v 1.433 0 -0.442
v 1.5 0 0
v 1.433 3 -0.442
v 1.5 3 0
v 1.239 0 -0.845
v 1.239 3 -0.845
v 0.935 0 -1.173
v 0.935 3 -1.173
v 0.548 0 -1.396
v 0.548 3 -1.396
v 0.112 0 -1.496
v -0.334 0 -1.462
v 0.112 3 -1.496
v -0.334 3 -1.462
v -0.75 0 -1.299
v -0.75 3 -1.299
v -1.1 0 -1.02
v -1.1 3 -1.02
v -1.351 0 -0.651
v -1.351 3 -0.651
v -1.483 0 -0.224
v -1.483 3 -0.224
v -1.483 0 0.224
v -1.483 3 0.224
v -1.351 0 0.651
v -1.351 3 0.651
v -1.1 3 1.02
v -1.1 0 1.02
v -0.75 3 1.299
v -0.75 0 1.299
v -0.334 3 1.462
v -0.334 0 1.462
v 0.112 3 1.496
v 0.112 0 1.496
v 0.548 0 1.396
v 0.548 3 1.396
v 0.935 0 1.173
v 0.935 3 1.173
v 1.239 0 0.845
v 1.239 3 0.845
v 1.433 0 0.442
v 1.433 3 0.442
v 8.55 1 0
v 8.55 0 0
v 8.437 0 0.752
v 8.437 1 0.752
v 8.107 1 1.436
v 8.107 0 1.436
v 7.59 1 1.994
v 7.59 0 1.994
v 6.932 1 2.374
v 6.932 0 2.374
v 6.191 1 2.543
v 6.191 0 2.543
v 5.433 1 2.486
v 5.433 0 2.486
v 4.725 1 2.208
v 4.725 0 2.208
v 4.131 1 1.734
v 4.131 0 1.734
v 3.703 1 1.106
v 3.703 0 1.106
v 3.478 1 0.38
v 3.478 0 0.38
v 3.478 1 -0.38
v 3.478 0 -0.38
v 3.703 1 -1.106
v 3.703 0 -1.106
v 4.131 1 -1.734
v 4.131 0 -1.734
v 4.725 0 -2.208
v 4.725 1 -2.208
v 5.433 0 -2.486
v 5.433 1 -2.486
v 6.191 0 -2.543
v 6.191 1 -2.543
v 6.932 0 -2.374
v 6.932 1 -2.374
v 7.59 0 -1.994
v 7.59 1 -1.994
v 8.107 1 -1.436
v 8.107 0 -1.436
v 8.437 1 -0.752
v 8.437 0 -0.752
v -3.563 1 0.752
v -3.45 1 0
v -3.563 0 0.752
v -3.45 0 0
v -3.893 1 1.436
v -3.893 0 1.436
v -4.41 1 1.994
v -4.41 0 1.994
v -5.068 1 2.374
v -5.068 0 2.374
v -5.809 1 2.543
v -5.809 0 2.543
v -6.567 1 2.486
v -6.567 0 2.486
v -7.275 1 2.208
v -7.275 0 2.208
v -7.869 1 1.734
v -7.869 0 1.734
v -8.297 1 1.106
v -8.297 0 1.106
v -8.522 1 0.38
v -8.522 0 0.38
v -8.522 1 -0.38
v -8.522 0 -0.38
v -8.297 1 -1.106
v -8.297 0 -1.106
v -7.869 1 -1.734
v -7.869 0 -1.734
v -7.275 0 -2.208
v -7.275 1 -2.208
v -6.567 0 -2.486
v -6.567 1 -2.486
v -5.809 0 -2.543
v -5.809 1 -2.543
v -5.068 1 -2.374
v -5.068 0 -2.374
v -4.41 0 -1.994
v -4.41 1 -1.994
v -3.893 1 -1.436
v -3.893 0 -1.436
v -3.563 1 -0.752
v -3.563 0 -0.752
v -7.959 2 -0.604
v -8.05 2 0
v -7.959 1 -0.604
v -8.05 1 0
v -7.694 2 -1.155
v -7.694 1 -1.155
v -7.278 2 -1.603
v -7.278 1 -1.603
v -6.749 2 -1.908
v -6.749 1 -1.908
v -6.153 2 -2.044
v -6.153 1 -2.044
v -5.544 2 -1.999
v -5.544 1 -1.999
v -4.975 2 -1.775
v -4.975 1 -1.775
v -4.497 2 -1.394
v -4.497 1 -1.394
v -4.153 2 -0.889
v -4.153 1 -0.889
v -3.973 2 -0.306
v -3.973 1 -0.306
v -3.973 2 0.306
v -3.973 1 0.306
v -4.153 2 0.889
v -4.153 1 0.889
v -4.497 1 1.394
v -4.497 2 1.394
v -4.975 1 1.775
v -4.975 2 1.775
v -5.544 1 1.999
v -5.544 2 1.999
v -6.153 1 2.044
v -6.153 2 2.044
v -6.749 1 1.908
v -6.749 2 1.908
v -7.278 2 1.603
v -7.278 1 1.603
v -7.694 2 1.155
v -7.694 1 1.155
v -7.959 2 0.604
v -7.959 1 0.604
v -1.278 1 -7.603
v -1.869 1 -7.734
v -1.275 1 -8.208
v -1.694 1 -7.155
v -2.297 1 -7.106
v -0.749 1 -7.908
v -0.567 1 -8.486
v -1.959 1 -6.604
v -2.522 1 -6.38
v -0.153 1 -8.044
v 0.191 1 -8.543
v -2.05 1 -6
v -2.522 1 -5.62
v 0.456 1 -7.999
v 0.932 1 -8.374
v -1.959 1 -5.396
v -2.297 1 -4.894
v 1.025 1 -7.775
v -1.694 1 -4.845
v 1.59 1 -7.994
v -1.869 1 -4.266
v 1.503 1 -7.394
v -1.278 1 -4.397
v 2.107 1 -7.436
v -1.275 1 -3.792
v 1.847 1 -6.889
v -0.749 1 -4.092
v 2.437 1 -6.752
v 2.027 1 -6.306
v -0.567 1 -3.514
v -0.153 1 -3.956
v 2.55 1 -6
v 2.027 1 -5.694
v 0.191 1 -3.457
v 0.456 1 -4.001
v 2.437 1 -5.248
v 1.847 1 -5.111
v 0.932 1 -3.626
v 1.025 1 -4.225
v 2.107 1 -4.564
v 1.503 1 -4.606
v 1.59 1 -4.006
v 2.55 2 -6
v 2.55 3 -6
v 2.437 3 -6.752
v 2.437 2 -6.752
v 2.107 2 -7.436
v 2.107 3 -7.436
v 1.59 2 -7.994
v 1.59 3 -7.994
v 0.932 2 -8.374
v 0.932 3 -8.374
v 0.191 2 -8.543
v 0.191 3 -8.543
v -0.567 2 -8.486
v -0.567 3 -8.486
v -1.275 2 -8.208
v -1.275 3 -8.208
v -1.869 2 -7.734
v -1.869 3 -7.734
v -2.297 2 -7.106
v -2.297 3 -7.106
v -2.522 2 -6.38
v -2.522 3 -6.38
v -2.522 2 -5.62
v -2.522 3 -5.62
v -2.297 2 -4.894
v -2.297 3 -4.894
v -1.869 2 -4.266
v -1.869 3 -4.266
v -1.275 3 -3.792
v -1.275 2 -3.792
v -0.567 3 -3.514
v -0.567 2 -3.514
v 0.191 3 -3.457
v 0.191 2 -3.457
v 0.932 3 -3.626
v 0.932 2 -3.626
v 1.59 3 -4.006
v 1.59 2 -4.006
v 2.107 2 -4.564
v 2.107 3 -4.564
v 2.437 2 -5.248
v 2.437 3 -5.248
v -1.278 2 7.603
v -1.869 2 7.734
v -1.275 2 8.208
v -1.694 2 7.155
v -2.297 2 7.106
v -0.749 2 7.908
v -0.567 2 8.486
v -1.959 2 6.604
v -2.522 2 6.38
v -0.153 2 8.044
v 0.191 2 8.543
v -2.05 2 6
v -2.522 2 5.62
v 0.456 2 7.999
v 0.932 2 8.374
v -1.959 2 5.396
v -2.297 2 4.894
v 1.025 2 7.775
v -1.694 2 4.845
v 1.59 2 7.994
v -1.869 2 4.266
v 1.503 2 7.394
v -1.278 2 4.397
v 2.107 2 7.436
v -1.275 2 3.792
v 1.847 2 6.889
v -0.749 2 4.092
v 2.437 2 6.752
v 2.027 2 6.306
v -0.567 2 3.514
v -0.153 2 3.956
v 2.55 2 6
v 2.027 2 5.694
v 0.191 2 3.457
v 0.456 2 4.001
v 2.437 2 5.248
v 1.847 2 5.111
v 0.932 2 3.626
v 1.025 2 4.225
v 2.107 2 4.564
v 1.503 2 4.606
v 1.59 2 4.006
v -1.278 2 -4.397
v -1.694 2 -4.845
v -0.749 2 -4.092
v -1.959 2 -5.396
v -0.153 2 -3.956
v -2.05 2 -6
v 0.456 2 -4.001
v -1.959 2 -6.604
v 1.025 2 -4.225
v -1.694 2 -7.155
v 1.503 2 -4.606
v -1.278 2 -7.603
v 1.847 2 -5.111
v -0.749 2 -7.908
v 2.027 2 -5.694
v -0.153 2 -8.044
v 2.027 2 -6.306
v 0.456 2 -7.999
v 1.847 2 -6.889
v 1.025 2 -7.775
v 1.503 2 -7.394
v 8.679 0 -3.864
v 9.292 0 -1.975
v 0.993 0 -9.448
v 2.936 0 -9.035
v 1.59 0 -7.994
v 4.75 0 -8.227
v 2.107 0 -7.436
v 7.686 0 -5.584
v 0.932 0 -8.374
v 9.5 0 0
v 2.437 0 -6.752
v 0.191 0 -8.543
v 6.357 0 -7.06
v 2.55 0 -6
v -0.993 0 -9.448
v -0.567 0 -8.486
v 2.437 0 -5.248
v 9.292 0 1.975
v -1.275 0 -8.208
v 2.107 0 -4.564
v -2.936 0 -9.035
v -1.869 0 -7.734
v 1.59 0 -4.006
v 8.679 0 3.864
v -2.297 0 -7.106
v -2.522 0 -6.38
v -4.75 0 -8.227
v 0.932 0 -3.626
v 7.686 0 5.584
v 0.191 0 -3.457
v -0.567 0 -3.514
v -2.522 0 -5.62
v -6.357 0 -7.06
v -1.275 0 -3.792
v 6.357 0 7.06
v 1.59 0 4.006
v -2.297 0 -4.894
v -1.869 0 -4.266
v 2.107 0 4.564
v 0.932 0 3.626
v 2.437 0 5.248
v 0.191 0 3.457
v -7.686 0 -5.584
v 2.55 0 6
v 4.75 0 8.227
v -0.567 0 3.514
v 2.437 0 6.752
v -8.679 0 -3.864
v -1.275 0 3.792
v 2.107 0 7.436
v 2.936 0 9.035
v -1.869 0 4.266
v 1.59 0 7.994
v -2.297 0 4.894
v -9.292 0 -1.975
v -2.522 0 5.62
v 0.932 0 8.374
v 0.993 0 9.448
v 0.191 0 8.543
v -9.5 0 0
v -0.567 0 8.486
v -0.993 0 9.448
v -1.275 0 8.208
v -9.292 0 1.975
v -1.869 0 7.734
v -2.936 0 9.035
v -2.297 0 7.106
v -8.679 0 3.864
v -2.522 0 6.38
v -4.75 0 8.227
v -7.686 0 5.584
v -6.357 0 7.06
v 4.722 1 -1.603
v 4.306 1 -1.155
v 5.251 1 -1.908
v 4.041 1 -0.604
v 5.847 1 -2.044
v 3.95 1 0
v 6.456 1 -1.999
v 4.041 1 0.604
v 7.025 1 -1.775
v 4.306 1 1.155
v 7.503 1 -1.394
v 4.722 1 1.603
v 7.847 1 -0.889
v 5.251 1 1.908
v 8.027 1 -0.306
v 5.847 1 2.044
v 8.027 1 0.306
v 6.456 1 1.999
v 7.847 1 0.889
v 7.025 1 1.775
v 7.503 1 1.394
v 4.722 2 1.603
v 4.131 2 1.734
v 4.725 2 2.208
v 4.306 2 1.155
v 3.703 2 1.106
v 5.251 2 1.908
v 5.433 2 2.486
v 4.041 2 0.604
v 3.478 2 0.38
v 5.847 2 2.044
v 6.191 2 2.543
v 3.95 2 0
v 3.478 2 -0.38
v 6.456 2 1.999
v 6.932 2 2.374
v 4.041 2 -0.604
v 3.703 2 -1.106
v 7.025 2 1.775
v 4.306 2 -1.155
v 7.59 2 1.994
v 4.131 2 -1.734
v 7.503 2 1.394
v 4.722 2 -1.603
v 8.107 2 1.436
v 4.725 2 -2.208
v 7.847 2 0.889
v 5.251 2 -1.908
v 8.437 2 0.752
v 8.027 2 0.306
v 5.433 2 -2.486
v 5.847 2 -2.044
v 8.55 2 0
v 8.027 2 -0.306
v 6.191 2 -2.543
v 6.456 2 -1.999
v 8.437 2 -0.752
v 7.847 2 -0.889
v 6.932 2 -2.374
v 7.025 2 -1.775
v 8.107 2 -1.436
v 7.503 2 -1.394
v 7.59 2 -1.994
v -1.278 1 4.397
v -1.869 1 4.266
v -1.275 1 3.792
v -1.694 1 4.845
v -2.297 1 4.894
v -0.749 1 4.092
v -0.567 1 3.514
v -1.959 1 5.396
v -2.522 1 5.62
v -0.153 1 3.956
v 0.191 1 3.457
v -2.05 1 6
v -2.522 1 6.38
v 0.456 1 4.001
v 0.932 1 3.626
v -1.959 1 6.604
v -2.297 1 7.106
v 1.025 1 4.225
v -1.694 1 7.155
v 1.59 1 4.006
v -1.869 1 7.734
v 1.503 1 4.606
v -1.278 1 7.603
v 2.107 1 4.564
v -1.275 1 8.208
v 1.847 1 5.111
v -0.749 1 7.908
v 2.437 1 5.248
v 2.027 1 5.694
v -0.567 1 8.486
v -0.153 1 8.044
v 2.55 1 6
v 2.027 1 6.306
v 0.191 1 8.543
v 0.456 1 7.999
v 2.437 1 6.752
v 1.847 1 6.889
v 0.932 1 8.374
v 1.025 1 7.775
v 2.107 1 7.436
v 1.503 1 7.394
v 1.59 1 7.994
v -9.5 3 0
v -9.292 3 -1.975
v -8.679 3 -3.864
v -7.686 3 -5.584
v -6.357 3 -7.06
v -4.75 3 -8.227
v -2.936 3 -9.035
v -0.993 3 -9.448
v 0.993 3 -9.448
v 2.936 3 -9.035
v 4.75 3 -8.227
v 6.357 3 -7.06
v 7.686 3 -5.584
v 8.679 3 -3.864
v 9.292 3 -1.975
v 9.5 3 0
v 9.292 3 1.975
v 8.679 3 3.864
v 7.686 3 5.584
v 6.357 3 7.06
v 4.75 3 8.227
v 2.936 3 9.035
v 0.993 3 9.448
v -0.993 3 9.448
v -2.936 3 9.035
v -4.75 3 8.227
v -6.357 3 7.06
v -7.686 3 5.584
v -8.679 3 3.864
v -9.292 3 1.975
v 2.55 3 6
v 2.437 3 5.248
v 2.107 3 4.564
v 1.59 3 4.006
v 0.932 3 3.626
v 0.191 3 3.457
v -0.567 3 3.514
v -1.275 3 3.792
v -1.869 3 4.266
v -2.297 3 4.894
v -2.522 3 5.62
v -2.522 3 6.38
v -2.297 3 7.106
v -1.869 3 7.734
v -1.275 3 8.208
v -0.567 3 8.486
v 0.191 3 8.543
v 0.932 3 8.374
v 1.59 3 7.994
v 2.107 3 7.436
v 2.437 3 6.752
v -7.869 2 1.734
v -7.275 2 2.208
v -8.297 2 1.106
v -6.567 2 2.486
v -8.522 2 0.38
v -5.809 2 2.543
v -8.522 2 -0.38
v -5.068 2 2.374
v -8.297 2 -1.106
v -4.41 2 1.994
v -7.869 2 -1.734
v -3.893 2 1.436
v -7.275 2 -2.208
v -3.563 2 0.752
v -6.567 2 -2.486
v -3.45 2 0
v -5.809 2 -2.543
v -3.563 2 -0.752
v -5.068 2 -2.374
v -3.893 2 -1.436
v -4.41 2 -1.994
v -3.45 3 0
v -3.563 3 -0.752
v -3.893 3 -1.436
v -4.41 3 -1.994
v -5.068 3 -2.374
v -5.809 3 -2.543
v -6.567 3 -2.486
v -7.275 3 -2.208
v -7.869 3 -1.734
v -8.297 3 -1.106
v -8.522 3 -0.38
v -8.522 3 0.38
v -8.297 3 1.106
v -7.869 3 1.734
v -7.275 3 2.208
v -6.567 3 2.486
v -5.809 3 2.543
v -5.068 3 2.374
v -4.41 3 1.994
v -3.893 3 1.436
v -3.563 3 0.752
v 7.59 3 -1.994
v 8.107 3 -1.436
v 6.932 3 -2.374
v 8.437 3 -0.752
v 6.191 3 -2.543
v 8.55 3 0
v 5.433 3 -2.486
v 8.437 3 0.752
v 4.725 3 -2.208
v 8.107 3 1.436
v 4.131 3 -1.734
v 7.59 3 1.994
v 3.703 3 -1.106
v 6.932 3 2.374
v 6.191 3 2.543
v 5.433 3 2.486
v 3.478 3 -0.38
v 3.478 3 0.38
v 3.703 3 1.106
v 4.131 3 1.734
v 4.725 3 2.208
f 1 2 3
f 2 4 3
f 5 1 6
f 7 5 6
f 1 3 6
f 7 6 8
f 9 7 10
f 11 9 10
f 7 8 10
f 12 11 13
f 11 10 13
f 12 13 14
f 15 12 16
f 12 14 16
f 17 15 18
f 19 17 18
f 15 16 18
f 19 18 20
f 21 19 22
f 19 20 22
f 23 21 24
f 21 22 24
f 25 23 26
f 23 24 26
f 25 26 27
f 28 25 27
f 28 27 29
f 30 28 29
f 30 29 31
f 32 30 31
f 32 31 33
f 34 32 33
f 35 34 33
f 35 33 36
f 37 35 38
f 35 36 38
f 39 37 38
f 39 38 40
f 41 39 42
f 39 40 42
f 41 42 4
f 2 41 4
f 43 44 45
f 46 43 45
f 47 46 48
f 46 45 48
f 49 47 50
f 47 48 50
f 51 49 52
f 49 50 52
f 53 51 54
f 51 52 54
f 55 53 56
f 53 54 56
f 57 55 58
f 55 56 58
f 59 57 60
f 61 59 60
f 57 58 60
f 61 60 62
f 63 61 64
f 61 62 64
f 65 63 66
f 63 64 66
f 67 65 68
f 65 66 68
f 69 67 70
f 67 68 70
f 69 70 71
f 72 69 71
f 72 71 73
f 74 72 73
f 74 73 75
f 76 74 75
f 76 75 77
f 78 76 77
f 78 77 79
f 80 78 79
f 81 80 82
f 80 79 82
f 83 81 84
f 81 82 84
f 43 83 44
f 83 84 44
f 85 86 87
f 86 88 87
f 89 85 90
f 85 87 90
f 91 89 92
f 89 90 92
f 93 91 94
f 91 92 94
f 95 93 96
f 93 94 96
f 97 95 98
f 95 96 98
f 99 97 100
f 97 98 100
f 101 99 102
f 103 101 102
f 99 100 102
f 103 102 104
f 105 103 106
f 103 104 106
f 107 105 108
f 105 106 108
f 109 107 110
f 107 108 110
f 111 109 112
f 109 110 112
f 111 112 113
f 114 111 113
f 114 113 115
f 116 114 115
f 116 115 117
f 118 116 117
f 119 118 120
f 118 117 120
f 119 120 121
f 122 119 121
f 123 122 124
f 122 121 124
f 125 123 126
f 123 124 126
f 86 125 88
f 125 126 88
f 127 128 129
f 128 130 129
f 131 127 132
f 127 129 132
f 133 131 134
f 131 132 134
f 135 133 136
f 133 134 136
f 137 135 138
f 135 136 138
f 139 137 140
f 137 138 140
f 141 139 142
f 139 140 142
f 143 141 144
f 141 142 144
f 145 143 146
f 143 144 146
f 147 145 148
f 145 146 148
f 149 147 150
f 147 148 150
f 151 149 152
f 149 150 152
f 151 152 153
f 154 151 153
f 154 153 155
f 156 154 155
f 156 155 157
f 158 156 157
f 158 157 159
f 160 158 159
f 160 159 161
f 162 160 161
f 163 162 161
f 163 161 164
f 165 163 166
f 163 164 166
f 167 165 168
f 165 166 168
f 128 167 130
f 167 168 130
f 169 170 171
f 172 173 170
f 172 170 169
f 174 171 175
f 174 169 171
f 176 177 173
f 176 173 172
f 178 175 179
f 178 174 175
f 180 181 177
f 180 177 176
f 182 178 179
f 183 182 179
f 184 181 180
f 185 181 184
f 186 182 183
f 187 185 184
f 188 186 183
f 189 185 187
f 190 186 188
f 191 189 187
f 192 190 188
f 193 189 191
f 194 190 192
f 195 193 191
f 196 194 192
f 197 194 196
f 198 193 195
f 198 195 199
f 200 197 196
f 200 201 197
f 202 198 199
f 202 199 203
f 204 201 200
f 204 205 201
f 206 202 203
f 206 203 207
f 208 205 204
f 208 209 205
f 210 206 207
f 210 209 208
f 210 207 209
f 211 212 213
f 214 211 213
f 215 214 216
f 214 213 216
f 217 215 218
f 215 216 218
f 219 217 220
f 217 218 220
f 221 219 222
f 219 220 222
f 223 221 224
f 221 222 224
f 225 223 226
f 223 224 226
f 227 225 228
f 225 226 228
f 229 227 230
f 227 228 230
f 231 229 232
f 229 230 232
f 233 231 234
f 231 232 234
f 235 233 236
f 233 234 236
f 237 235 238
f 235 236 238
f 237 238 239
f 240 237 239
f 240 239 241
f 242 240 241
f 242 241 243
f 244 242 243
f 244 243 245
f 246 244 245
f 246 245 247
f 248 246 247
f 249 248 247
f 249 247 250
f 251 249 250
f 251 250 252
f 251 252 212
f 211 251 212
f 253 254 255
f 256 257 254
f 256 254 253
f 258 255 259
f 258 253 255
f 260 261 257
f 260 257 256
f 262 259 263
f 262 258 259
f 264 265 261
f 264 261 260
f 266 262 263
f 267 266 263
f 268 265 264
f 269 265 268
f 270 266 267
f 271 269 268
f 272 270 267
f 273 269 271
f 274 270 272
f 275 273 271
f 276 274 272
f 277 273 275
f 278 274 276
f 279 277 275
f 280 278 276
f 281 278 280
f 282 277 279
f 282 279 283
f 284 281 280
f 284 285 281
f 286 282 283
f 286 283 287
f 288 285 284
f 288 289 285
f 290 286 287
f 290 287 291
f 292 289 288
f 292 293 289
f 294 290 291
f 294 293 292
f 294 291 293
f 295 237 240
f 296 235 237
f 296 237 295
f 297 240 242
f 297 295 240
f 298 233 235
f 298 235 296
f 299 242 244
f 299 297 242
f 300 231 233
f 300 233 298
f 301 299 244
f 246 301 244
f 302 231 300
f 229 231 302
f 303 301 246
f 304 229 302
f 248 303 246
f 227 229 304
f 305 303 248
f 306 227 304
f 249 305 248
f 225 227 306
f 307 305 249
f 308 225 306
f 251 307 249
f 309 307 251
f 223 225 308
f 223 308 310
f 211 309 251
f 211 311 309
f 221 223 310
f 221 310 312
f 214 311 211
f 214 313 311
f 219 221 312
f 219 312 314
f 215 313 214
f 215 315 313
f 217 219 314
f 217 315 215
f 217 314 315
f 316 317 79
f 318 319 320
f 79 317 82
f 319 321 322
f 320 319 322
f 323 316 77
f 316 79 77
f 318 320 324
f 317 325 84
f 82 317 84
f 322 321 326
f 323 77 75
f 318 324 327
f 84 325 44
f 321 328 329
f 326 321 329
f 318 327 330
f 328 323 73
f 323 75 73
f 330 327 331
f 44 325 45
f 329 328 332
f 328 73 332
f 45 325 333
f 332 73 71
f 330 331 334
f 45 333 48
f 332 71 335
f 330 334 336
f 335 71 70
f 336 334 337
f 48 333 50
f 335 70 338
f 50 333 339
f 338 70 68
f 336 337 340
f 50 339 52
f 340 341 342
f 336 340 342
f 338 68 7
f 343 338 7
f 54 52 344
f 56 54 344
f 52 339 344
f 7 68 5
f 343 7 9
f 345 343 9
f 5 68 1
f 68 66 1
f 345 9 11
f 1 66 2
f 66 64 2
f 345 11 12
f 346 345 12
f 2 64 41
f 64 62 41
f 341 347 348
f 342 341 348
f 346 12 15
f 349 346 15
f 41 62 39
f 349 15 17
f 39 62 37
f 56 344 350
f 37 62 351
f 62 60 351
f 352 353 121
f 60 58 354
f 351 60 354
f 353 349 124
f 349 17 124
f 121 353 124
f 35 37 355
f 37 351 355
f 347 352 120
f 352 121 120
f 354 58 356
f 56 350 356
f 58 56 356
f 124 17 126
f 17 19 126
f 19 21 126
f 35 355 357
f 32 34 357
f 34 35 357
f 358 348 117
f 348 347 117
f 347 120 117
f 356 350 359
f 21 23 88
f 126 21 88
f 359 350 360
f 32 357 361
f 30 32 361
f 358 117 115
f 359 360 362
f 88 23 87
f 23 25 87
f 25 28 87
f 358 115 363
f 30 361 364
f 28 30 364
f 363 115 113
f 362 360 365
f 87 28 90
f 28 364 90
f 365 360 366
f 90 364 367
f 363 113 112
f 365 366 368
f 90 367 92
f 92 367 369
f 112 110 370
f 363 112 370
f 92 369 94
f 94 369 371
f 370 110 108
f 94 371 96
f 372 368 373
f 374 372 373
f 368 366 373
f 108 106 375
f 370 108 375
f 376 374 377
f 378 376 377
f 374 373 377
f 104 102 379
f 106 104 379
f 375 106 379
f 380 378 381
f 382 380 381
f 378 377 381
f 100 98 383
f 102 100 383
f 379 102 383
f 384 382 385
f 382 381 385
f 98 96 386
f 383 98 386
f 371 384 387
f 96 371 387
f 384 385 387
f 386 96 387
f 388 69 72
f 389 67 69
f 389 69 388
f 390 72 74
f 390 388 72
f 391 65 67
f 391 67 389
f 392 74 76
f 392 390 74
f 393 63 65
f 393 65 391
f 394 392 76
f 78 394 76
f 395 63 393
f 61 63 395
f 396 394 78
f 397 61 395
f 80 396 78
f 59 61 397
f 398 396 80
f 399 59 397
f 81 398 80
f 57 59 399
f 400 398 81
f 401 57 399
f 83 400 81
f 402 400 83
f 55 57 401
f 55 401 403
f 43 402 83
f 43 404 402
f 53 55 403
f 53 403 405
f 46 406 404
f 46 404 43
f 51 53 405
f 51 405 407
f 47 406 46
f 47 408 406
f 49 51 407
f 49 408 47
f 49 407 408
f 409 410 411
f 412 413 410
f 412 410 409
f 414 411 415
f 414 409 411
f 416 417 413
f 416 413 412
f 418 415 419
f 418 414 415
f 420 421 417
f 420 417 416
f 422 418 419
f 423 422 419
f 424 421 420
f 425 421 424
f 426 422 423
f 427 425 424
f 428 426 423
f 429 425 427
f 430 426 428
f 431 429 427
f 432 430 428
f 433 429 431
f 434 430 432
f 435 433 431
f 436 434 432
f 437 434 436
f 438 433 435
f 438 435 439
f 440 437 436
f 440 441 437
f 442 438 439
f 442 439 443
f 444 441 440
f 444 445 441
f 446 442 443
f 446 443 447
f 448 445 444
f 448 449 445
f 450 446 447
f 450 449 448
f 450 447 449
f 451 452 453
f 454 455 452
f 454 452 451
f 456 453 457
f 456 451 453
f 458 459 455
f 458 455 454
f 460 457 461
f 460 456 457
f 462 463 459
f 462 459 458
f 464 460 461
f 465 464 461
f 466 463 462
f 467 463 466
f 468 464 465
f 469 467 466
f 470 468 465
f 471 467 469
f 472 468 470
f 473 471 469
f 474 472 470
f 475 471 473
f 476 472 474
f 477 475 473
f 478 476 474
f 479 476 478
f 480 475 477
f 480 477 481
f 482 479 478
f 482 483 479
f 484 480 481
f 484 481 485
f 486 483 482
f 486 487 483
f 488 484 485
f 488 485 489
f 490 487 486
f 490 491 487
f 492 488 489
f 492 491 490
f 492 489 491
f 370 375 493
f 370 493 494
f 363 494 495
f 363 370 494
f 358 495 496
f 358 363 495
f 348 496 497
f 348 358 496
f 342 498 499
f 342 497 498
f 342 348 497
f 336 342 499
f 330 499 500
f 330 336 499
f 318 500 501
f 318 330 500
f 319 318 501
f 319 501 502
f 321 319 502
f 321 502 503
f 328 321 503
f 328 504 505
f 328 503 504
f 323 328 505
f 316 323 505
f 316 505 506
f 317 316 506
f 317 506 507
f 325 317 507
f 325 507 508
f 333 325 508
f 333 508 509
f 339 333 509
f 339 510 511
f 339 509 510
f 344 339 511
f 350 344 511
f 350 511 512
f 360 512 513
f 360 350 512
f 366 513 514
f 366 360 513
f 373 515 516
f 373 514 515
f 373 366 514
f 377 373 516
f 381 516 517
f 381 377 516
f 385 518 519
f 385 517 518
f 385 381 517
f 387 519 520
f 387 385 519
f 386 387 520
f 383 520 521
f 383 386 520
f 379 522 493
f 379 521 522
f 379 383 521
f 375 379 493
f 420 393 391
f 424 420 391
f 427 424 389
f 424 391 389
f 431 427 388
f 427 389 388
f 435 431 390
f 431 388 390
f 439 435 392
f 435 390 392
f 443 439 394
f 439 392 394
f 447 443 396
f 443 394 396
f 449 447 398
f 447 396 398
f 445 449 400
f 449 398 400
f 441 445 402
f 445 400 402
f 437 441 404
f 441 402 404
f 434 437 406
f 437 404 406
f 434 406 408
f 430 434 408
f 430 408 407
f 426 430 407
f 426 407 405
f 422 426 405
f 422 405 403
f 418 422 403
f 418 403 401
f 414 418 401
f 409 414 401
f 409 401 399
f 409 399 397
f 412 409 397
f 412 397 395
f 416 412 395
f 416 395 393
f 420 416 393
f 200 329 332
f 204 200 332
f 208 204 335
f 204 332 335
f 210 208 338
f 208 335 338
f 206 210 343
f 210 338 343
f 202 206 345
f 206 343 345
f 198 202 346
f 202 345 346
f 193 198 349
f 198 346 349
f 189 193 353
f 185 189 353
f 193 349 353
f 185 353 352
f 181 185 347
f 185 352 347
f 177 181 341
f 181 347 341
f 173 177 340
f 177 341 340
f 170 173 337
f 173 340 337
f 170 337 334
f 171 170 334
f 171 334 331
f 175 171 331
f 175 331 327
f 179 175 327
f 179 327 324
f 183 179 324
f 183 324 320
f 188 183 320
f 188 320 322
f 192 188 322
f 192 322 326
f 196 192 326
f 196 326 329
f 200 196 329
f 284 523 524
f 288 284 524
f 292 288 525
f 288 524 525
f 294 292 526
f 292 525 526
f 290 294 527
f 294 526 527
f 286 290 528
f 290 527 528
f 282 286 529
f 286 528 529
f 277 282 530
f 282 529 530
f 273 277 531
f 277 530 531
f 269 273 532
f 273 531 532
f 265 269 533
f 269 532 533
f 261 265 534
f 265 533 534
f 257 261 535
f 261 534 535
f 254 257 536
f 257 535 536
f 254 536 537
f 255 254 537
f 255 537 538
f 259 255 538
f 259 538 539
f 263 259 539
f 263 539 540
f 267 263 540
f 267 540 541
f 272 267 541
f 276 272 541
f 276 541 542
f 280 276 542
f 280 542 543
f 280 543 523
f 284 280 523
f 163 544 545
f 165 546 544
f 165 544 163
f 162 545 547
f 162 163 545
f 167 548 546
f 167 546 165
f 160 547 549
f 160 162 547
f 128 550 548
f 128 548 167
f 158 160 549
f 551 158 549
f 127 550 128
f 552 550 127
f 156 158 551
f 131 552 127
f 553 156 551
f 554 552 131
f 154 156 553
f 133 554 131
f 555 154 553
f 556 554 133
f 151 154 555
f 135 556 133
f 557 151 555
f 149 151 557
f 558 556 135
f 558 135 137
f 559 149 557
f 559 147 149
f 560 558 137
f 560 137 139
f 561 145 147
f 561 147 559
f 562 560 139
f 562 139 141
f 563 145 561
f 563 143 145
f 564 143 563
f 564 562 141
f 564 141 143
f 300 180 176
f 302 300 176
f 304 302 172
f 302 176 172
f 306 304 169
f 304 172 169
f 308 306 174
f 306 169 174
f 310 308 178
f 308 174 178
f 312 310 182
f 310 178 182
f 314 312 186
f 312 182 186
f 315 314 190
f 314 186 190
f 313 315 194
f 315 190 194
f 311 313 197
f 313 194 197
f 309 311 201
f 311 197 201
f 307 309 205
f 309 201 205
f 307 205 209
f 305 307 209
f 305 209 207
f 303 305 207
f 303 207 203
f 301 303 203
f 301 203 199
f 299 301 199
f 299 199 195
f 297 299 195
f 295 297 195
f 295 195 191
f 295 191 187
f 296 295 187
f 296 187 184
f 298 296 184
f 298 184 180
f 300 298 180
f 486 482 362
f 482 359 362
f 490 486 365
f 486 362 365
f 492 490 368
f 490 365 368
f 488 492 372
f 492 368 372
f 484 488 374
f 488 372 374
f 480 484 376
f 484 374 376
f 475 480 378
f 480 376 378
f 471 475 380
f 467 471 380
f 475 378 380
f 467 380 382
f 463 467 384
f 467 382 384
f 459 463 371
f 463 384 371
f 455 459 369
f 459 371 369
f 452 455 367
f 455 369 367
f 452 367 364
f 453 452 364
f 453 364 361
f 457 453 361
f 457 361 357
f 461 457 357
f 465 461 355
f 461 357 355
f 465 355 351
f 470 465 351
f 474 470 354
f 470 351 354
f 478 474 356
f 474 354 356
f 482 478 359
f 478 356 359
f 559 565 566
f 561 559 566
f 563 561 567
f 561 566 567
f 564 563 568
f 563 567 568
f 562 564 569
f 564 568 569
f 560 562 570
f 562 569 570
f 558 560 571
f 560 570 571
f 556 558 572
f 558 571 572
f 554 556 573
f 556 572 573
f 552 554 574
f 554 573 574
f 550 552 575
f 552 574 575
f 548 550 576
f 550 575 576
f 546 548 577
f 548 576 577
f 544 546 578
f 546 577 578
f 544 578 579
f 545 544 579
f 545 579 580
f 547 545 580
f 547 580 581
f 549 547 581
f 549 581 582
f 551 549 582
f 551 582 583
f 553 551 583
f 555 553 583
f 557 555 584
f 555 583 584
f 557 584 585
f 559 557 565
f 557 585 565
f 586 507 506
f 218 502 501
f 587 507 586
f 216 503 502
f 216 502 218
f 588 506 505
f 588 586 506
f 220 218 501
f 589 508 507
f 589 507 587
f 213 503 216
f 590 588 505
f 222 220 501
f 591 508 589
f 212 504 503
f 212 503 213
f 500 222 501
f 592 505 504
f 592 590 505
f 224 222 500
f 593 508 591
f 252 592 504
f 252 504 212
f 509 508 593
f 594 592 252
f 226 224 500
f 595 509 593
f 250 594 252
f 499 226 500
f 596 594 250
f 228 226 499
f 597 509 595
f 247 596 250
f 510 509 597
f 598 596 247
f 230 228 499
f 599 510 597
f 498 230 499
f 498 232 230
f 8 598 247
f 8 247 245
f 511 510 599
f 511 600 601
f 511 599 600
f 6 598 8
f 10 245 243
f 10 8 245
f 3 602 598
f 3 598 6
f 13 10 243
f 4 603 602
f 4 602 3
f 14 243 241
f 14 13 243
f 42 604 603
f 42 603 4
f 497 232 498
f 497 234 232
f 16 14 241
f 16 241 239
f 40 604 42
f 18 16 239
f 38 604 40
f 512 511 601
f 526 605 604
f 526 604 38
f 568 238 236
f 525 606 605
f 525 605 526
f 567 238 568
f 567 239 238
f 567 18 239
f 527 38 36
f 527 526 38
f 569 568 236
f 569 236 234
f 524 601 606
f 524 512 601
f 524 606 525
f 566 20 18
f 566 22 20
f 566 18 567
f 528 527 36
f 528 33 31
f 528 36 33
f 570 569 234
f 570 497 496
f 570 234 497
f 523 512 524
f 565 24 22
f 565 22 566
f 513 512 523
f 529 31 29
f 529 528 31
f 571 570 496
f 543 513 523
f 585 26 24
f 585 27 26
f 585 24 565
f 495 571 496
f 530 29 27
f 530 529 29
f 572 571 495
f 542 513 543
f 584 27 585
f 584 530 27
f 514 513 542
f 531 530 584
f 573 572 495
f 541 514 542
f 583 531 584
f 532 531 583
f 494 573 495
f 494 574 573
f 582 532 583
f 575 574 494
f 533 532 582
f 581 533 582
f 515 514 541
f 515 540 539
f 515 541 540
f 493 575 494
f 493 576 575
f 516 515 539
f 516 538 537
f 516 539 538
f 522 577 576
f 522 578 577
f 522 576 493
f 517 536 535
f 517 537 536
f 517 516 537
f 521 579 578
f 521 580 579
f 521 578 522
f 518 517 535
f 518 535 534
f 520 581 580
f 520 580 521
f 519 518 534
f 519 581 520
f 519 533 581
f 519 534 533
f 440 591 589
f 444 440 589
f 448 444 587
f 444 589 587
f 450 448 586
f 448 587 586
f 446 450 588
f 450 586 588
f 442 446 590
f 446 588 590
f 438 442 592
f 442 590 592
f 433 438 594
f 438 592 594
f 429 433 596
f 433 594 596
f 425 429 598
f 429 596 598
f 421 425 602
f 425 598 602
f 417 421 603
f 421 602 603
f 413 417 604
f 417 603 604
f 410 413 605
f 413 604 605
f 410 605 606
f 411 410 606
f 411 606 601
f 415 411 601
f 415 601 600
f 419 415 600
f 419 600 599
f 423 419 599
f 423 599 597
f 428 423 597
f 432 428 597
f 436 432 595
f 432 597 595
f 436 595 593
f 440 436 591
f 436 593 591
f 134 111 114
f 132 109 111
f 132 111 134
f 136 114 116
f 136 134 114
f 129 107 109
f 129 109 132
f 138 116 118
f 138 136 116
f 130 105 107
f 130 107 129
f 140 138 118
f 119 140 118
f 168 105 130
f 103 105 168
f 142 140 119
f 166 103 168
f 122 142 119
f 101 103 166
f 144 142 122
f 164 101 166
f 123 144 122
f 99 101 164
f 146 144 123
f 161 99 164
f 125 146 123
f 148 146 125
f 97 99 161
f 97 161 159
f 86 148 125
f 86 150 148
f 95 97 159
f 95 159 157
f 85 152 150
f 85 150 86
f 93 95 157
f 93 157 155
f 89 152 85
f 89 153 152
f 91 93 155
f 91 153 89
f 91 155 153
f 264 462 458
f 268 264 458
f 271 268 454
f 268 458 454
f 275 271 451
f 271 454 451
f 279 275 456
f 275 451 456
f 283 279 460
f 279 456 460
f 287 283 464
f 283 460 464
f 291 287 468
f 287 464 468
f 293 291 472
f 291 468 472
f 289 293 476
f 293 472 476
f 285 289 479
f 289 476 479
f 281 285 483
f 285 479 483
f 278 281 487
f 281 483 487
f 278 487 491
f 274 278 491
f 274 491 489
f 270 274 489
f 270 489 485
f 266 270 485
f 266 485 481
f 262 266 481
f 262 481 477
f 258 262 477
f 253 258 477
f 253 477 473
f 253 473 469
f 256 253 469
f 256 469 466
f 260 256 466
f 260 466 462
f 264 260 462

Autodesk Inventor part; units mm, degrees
ref_plane "YZ Plane" through (0, 0, 0) normal (1, 0, 0) x (0, 1, 0)
ref_plane "XZ Plane" through (0, 0, 0) normal (0, 1, 0) x (-1, 0, 0)
ref_plane "XY Plane" through (0, 0, 0) normal (0, 0, 1) x (1, 0, 0)
sketch "Esquisse1" plane through (0, 0, 0) normal (0, 1, 0) x (-1, 0, 0)
  circle A0 centre (0, 0) radius 9.5
  circle A1 centre (0, 0) radius 2.05 construction
  line L0 (0, 9.5) -> (0, -9.5) construction
  line L1 (-9.5, 0) -> (9.5, 0) construction
  circle A2 centre (0, -6) radius 2.05
  circle A3 centre (0, 6) radius 2.05
  circle A4 centre (0, 0) radius 2.05 construction
  circle A5 centre (6, 0) radius 2.05
  circle A6 centre (-6, 0) radius 2.05
  circle A7 centre (0, 0) radius 2.05 construction
  dimension "d0" = 19
  dimension "d1" = 4.1
  dimension "d4" = 6
  dimension "d7" = 6
  dimension "d12" = 6
  dimension "d15" = 6
extrude "Extrusion1" add sketch "Esquisse1" along normal blind 3
sketch "Esquisse2" plane through (0, 3, 0) normal (0, 1, 0) x (1, 0, 0)
  circle A0 centre (0, 0) radius 9.5 construction
  circle A1 centre (0, 0) radius 1.5
  dimension "d20" = 3
extrude "Extrusion2" cut sketch "Esquisse2" against normal through all
sketch "Sketch3" plane through (0, 0, 0) normal (0, -1, 0) x (1, 0, 0)
  circle A0 centre (-6, 0) radius 2.05 projected
  circle A1 centre (0, 6) radius 2.05 projected
  circle A2 centre (6, 0) radius 2.05 projected
  circle A3 centre (0, -6) radius 2.05 projected
  circle A4 centre (0, -6) radius 2.55
  circle A5 centre (6, 0) radius 2.55
  circle A6 centre (-6, 0) radius 2.55
  circle A7 centre (0, 6) radius 2.55
  point P0 (0, 0)
  dimension "d23" = 5.1
  dimension "d24" = 5.1
  dimension "d25" = 5.1
  dimension "d26" = 5.1
extrude "Extrusion3" cut sketch "Sketch3" against normal blind 1
sketch "Sketch4" plane through (0, 3, 0) normal (0, 1, 0) x (1, 0, 0)
  circle A0 centre (0, -6) radius 2.55 projected
  circle A1 centre (0, -6) radius 2.55
  circle A2 centre (-6, 0) radius 2.55 projected
  circle A3 centre (-6, 0) radius 2.55
  circle A4 centre (0, 6) radius 2.55 projected
  circle A5 centre (0, 6) radius 2.55
  circle A6 centre (6, 0) radius 2.55 projected
  circle A7 centre (6, 0) radius 2.55
  point P0 (0, 0)
extrude "Extrusion4" cut sketch "Sketch4" against normal blind 1
properties part number "XL320_HubToOllo"
